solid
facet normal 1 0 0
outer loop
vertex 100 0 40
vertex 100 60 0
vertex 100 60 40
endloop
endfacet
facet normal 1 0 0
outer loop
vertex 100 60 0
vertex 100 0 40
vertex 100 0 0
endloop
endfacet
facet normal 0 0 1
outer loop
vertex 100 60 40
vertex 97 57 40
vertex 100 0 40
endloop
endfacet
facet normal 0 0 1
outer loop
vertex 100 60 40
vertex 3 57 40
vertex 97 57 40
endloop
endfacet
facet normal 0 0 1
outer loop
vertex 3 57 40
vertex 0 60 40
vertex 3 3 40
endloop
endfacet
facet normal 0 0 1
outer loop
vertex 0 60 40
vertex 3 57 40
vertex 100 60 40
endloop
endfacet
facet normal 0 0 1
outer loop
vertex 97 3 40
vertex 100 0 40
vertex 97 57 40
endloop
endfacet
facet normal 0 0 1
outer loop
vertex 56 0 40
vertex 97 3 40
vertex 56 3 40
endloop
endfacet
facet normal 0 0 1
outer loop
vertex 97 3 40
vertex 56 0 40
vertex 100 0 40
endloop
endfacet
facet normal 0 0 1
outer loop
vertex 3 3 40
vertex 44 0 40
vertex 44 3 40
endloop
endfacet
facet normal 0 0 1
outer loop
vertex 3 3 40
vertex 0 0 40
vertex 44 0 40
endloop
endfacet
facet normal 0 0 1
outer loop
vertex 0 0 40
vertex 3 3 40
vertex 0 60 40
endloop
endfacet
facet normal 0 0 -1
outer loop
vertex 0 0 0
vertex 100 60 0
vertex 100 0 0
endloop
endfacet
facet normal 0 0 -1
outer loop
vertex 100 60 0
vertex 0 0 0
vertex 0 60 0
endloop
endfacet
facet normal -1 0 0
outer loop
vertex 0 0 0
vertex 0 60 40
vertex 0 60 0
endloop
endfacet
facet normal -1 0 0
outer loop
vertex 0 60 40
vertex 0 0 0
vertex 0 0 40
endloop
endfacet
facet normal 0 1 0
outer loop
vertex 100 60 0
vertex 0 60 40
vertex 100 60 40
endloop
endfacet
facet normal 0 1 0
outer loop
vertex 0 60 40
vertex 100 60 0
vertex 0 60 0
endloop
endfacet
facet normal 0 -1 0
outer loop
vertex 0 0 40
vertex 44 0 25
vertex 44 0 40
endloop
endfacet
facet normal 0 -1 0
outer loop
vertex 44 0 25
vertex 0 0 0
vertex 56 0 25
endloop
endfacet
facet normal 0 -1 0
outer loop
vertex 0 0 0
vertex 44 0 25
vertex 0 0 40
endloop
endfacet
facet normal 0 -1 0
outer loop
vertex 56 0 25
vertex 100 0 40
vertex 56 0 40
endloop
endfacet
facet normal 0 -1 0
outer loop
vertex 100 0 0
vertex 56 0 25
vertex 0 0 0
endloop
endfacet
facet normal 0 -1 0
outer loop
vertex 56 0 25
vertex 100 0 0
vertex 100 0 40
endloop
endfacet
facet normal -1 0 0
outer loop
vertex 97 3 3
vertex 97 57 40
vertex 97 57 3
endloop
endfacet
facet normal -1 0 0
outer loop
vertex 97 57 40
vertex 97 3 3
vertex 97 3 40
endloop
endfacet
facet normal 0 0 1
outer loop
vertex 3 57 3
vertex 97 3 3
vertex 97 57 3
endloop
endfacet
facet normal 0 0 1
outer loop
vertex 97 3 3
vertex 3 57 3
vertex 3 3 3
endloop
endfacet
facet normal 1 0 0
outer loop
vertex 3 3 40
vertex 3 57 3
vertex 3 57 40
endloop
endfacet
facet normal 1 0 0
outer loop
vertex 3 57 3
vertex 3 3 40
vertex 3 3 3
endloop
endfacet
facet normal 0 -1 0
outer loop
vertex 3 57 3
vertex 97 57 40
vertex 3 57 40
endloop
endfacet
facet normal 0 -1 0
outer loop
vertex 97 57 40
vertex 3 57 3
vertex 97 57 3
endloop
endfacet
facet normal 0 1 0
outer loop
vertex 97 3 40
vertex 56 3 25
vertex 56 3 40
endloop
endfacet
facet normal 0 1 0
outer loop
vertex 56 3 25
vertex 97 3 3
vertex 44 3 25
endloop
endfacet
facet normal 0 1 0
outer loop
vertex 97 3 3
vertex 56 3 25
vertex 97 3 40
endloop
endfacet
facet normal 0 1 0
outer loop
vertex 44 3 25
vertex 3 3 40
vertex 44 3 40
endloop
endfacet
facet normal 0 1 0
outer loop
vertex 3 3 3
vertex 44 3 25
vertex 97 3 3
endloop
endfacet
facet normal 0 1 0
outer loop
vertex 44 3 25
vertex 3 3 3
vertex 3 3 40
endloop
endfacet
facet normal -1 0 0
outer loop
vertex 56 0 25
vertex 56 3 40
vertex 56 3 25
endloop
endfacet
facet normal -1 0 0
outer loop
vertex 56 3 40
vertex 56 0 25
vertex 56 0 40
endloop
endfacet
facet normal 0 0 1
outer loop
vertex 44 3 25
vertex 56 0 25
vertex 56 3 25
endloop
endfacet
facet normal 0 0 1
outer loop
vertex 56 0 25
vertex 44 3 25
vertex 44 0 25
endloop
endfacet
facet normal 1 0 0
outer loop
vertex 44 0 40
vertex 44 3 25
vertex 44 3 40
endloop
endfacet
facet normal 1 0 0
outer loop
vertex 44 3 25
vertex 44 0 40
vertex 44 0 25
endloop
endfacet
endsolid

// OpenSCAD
$fn = 32;

// ----------------------------------------------------------------------
// Enclosure box: notch enclosure
// ----------------------------------------------------------------------

// --- parameters (mm) ---
box_l = 100;              // outer length, X
box_w = 60;               // outer width, Y
box_h = 40;               // outer height
wall_t = 3;               // wall thickness
notch_w = 12;             // cable notch width
notch_h = 15;             // cable notch height

inner_h = box_h - wall_t;  // cavity depth
boss_h = inner_h - 2;  // corner boss height

difference() {
  cube([box_l, box_w, box_h]);
  translate([wall_t, wall_t, wall_t])
    cube([box_l - 2 * wall_t, box_w - 2 * wall_t, box_h]);
  translate([box_l / 2 - notch_w / 2, -1, box_h - notch_h])
    cube([notch_w, wall_t + 2, notch_h + 1]);
}
